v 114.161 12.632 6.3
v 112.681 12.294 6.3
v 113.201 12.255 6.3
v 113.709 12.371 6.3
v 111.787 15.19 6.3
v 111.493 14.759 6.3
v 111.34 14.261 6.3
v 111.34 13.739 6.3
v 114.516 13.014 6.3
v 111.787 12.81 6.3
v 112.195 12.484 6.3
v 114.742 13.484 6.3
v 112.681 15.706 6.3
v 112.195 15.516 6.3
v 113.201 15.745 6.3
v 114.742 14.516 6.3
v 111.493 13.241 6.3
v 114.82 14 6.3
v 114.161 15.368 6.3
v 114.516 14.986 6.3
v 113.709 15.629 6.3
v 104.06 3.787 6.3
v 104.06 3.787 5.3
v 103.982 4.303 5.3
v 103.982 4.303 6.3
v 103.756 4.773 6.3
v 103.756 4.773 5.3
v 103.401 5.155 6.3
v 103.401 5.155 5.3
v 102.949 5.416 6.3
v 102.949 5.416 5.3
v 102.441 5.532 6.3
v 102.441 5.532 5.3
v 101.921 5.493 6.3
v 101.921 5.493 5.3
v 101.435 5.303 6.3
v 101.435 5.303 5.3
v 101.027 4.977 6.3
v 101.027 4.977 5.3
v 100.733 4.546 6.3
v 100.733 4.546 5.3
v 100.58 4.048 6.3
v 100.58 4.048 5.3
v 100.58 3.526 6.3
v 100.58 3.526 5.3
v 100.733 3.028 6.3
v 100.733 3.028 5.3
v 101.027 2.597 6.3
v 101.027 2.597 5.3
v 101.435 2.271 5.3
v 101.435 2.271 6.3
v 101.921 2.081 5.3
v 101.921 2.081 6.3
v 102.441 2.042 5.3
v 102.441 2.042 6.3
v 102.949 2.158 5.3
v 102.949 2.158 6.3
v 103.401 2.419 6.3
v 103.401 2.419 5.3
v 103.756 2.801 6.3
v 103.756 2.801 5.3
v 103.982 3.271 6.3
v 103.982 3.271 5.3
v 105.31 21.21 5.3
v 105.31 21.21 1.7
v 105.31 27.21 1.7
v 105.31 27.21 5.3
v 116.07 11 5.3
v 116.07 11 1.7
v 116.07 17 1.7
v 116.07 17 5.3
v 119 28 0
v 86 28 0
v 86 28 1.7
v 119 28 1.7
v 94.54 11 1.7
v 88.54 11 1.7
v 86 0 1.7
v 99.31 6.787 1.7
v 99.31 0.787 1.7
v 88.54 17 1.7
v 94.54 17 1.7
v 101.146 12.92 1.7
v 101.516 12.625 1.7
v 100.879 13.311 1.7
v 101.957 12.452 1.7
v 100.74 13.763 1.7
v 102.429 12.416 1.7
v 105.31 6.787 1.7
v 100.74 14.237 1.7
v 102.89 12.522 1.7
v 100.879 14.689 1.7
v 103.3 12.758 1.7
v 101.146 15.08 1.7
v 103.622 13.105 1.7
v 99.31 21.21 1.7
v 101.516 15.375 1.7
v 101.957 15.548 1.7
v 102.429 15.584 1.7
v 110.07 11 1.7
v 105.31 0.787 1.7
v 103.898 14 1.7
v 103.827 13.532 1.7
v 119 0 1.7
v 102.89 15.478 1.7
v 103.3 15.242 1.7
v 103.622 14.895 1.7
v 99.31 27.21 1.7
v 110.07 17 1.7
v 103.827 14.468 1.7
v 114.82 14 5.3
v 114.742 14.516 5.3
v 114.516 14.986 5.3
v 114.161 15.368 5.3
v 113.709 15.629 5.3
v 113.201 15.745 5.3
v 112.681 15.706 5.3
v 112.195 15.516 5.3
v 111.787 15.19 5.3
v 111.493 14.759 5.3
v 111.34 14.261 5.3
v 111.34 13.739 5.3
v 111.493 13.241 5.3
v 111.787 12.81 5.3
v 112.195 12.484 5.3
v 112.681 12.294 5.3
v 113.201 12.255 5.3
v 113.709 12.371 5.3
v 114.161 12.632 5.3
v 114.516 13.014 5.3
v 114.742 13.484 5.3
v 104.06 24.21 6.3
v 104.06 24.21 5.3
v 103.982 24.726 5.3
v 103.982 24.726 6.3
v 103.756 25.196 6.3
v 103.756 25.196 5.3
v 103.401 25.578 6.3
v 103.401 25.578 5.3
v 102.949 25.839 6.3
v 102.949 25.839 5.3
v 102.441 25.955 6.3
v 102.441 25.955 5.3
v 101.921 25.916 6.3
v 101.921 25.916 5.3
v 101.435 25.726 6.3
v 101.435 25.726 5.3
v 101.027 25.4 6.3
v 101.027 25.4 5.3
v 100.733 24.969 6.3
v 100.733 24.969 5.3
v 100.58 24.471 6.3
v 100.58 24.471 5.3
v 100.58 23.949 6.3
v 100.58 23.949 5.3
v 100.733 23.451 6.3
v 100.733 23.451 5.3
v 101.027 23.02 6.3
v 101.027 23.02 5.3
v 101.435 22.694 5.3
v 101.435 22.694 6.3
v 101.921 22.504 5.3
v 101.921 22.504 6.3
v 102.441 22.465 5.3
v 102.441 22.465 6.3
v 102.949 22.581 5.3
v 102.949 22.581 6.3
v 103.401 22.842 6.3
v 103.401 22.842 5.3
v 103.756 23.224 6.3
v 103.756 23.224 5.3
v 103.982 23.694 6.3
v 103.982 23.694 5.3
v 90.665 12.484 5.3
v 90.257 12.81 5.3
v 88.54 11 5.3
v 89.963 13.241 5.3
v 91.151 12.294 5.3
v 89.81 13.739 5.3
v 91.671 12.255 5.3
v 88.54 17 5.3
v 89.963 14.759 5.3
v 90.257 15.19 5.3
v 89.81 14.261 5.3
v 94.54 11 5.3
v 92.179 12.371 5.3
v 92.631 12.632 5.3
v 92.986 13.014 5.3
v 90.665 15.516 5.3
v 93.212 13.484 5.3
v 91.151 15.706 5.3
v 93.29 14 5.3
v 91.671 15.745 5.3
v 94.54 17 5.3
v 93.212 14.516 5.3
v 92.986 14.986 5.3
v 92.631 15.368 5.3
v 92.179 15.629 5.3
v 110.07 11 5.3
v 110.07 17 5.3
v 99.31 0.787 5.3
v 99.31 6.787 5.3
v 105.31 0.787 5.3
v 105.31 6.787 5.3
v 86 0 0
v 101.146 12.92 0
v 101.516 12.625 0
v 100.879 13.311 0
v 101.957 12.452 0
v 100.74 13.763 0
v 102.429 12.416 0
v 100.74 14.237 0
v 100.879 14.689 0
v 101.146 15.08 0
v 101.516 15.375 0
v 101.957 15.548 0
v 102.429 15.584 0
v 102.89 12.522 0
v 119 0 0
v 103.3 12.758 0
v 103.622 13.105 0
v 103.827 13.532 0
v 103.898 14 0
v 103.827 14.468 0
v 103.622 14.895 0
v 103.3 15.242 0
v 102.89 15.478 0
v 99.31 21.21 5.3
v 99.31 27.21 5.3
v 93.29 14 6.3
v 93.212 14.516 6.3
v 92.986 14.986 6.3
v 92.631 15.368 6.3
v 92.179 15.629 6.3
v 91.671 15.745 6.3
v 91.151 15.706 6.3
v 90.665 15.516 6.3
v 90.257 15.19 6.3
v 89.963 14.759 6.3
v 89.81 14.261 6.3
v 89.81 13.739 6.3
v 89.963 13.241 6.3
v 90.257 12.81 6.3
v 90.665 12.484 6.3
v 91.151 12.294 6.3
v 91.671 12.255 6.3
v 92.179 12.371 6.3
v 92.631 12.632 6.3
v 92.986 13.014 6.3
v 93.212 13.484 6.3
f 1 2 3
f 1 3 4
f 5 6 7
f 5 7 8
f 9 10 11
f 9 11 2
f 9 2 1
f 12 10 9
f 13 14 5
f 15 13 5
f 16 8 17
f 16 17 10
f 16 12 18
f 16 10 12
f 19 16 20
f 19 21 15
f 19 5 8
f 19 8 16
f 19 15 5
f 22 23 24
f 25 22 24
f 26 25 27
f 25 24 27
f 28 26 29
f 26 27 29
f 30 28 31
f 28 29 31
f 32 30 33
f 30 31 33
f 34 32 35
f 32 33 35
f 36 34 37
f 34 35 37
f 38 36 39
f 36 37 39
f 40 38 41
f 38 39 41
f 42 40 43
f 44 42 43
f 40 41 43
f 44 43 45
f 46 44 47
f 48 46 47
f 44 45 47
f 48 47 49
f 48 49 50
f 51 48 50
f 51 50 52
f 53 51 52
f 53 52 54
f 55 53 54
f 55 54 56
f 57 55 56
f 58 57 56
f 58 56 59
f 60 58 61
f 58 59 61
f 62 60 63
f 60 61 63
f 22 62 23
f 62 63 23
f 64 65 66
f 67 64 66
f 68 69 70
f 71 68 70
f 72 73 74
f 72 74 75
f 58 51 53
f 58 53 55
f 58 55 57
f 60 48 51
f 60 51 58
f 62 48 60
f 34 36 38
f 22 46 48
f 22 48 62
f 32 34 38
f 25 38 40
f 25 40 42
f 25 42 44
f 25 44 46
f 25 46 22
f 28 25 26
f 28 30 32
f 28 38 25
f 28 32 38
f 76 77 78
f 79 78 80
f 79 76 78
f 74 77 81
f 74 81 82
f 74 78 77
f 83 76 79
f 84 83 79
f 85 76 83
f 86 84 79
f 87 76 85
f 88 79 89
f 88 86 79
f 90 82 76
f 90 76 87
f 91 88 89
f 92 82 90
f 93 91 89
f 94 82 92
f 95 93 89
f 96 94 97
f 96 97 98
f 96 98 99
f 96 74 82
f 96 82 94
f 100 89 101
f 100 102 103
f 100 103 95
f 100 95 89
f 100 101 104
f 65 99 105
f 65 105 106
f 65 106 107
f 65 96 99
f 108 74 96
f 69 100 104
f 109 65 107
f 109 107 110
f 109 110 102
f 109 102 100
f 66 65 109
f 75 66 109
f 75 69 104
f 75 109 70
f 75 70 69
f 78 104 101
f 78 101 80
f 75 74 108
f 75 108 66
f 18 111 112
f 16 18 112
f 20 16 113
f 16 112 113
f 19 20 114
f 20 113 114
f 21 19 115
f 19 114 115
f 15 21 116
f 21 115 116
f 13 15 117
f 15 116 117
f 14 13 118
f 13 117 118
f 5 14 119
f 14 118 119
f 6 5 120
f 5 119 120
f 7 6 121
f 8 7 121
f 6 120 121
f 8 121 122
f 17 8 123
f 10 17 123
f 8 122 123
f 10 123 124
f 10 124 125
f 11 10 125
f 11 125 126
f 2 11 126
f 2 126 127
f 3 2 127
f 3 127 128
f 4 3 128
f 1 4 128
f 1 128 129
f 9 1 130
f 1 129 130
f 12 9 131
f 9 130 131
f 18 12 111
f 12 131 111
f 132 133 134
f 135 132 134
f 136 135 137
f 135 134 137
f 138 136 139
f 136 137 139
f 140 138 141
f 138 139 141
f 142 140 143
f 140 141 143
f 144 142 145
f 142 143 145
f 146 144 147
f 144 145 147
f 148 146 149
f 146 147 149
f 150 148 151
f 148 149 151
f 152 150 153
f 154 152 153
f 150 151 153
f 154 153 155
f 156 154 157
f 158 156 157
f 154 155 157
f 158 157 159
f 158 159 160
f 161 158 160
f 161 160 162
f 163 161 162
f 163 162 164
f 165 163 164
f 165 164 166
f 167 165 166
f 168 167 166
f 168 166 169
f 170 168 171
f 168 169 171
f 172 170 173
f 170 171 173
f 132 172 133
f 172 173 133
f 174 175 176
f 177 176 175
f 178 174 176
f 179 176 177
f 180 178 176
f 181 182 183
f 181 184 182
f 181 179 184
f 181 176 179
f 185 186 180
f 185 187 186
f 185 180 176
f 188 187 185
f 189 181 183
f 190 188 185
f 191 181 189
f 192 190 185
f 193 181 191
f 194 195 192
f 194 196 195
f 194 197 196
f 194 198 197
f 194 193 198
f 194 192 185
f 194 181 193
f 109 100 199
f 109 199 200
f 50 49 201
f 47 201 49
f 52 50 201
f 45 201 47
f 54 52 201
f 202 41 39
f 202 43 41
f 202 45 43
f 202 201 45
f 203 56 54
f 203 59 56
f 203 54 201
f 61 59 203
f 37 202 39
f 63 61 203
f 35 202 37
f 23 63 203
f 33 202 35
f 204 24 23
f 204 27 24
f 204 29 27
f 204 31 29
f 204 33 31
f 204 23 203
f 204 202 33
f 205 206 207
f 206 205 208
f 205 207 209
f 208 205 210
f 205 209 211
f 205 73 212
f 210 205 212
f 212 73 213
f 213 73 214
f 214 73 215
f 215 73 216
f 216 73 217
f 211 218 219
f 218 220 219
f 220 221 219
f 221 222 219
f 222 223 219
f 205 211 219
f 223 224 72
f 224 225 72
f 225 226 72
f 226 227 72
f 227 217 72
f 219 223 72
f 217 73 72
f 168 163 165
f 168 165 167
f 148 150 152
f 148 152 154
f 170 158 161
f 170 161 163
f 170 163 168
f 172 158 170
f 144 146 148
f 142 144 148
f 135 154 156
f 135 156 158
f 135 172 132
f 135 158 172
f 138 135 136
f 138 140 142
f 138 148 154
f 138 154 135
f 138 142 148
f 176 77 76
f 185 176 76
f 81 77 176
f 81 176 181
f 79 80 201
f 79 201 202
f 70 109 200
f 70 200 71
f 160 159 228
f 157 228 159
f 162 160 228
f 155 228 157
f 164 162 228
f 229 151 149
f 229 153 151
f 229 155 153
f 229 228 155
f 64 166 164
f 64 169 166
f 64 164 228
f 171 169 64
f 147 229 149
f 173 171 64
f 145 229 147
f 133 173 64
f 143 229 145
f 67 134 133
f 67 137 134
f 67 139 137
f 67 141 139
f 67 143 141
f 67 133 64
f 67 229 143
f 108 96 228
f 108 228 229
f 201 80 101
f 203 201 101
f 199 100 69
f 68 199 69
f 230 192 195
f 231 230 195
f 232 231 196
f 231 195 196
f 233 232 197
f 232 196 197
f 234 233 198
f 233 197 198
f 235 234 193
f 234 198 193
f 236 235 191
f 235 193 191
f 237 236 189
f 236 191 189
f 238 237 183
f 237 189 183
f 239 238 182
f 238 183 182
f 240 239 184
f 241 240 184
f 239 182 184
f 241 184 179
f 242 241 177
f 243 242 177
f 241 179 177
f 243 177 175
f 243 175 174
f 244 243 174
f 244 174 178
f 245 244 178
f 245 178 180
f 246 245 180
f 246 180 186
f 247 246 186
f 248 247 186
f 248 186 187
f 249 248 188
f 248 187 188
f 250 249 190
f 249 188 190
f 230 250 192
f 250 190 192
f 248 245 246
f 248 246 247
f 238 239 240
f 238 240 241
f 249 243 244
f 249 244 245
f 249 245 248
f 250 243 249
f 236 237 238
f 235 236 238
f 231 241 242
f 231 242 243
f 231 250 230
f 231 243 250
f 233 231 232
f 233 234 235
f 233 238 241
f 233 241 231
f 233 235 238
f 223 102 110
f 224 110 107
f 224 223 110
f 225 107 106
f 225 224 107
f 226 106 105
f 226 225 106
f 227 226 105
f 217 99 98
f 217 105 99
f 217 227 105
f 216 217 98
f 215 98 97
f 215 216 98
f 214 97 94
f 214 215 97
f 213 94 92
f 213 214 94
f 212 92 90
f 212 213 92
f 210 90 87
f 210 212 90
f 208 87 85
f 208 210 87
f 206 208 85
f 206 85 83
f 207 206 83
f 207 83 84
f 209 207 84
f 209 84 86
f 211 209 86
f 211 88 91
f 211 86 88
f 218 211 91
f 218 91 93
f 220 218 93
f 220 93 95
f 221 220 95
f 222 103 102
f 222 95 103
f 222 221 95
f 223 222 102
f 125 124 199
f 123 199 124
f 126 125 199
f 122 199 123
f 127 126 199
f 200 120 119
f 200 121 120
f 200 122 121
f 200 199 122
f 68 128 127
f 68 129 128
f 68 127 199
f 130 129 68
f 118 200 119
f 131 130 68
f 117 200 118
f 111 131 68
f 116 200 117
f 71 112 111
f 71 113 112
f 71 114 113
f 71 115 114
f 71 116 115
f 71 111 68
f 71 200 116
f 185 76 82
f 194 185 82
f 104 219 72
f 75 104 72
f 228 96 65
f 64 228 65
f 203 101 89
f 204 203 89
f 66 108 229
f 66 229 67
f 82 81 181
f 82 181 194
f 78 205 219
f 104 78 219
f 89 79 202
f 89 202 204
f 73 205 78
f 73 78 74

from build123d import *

# Parameters (mm, degrees)
CYLINDER001_R     = 1.75
CYLINDER001_DEPTH = 1
BOX002_W          = 6
BOX002_H          = 6
BOX002_DEPTH      = 3.6
CYLINDER002_R     = 1.75
CYLINDER002_DEPTH = 1
BOX003_W          = 6
BOX003_H          = 6
BOX003_DEPTH      = 3.6
CYLINDER003_R     = 1.75
CYLINDER003_DEPTH = 1
BOX004_W          = 6
BOX004_H          = 6
BOX004_DEPTH      = 3.6
CYLINDER004_R     = 1.588
CYLINDER004_DEPTH = 2
BOX001_W          = 33
BOX001_H          = 28
BOX001_DEPTH      = 1.7
CYLINDER_R        = 1.75
CYLINDER_DEPTH    = 1
BOX_W             = 6
BOX_H             = 6
BOX_DEPTH         = 3.6


with BuildPart() as btnrt_top:
    # Cylinder001 → Cylinder001 (new body)
    with BuildSketch(Plane(origin=(3, 3, 3.6), x_dir=(1, 0, 0), z_dir=(0, 0, 1))):
        Circle(CYLINDER001_R)
    extrude(amount=CYLINDER001_DEPTH)


with BuildPart() as btn2:
    # Box002 → Box002 (new body)
    with BuildSketch(Plane.XY):
        with Locations((3, 3)):
            Rectangle(BOX002_W, BOX002_H)
    extrude(amount=BOX002_DEPTH)

    # Fusion011: union Btnrt_Top
    add(btnrt_top.part)


with BuildPart() as btn2_1:
    # Fusion011 placement: moved
    add(btn2.part.moved(Location((24.07, 11, 1.7))))


with BuildPart() as btnup_top:
    # Cylinder002 → Cylinder002 (new body)
    with BuildSketch(Plane(origin=(3, 3, 3.6), x_dir=(1, 0, 0), z_dir=(0, 0, 1))):
        Circle(CYLINDER002_R)
    extrude(amount=CYLINDER002_DEPTH)


with BuildPart() as btn1:
    # Box003 → Box003 (new body)
    with BuildSketch(Plane.XY):
        with Locations((3, 3)):
            Rectangle(BOX003_W, BOX003_H)
    extrude(amount=BOX003_DEPTH)

    # Fusion010: union Btnup_Top
    add(btnup_top.part)


with BuildPart() as btn1_1:
    # Fusion010 placement: moved
    add(btn1.part.moved(Location((13.31, 21.21, 1.7))))


with BuildPart() as btndn_top:
    # Cylinder003 → Cylinder003 (new body)
    with BuildSketch(Plane(origin=(3, 3, 3.6), x_dir=(1, 0, 0), z_dir=(0, 0, 1))):
        Circle(CYLINDER003_R)
    extrude(amount=CYLINDER003_DEPTH)


with BuildPart() as btn3:
    # Box004 → Box004 (new body)
    with BuildSketch(Plane.XY):
        with Locations((3, 3)):
            Rectangle(BOX004_W, BOX004_H)
    extrude(amount=BOX004_DEPTH)

    # Fusion009: union Btndn_Top
    add(btndn_top.part)


with BuildPart() as btn3_1:
    # Fusion009 placement: moved
    add(btn3.part.moved(Location((13.31, 0.787, 1.7))))


with BuildPart() as dpad_center_hole:
    # Cylinder004 → Cylinder004 (new body)
    with BuildSketch(Plane(origin=(16.31, 14, 0), x_dir=(1, 0, 0), z_dir=(0, 0, 1))):
        Circle(CYLINDER004_R)
    extrude(amount=CYLINDER004_DEPTH)


with BuildPart() as cut006:
    # Box001 → Box001 (new body)
    with BuildSketch(Plane.XY):
        with Locations((16.5, 14)):
            Rectangle(BOX001_W, BOX001_H)
    extrude(amount=BOX001_DEPTH)

    # Cut006: cut Dpad_Center_Hole
    add(dpad_center_hole.part, mode=Mode.SUBTRACT)


with BuildPart() as btnlft_top:
    # Cylinder → Cylinder (new body)
    with BuildSketch(Plane(origin=(3, 3, 3.6), x_dir=(1, 0, 0), z_dir=(0, 0, 1))):
        Circle(CYLINDER_R)
    extrude(amount=CYLINDER_DEPTH)


with BuildPart() as main_buttons_pcb:
    # Box → Box (new body)
    with BuildSketch(Plane.XY):
        with Locations((3, 3)):
            Rectangle(BOX_W, BOX_H)
    extrude(amount=BOX_DEPTH)

    # Fusion012: union Btnlft_Top
    add(btnlft_top.part)


with BuildPart() as main_buttons_pcb_1:
    # Fusion012 placement: moved
    add(main_buttons_pcb.part.moved(Location((2.54, 11, 1.7))))

    # Fusion008: union Btn2, Btn1, Btn3, Cut006
    add(btn2_1.part)
    add(btn1_1.part)
    add(btn3_1.part)
    add(cut006.part)


with BuildPart() as main_buttons_pcb_2:
    # Fusion008 placement: moved
    add(main_buttons_pcb_1.part.moved(Location((86, 0, 0))))


solid = main_buttons_pcb_2.part
